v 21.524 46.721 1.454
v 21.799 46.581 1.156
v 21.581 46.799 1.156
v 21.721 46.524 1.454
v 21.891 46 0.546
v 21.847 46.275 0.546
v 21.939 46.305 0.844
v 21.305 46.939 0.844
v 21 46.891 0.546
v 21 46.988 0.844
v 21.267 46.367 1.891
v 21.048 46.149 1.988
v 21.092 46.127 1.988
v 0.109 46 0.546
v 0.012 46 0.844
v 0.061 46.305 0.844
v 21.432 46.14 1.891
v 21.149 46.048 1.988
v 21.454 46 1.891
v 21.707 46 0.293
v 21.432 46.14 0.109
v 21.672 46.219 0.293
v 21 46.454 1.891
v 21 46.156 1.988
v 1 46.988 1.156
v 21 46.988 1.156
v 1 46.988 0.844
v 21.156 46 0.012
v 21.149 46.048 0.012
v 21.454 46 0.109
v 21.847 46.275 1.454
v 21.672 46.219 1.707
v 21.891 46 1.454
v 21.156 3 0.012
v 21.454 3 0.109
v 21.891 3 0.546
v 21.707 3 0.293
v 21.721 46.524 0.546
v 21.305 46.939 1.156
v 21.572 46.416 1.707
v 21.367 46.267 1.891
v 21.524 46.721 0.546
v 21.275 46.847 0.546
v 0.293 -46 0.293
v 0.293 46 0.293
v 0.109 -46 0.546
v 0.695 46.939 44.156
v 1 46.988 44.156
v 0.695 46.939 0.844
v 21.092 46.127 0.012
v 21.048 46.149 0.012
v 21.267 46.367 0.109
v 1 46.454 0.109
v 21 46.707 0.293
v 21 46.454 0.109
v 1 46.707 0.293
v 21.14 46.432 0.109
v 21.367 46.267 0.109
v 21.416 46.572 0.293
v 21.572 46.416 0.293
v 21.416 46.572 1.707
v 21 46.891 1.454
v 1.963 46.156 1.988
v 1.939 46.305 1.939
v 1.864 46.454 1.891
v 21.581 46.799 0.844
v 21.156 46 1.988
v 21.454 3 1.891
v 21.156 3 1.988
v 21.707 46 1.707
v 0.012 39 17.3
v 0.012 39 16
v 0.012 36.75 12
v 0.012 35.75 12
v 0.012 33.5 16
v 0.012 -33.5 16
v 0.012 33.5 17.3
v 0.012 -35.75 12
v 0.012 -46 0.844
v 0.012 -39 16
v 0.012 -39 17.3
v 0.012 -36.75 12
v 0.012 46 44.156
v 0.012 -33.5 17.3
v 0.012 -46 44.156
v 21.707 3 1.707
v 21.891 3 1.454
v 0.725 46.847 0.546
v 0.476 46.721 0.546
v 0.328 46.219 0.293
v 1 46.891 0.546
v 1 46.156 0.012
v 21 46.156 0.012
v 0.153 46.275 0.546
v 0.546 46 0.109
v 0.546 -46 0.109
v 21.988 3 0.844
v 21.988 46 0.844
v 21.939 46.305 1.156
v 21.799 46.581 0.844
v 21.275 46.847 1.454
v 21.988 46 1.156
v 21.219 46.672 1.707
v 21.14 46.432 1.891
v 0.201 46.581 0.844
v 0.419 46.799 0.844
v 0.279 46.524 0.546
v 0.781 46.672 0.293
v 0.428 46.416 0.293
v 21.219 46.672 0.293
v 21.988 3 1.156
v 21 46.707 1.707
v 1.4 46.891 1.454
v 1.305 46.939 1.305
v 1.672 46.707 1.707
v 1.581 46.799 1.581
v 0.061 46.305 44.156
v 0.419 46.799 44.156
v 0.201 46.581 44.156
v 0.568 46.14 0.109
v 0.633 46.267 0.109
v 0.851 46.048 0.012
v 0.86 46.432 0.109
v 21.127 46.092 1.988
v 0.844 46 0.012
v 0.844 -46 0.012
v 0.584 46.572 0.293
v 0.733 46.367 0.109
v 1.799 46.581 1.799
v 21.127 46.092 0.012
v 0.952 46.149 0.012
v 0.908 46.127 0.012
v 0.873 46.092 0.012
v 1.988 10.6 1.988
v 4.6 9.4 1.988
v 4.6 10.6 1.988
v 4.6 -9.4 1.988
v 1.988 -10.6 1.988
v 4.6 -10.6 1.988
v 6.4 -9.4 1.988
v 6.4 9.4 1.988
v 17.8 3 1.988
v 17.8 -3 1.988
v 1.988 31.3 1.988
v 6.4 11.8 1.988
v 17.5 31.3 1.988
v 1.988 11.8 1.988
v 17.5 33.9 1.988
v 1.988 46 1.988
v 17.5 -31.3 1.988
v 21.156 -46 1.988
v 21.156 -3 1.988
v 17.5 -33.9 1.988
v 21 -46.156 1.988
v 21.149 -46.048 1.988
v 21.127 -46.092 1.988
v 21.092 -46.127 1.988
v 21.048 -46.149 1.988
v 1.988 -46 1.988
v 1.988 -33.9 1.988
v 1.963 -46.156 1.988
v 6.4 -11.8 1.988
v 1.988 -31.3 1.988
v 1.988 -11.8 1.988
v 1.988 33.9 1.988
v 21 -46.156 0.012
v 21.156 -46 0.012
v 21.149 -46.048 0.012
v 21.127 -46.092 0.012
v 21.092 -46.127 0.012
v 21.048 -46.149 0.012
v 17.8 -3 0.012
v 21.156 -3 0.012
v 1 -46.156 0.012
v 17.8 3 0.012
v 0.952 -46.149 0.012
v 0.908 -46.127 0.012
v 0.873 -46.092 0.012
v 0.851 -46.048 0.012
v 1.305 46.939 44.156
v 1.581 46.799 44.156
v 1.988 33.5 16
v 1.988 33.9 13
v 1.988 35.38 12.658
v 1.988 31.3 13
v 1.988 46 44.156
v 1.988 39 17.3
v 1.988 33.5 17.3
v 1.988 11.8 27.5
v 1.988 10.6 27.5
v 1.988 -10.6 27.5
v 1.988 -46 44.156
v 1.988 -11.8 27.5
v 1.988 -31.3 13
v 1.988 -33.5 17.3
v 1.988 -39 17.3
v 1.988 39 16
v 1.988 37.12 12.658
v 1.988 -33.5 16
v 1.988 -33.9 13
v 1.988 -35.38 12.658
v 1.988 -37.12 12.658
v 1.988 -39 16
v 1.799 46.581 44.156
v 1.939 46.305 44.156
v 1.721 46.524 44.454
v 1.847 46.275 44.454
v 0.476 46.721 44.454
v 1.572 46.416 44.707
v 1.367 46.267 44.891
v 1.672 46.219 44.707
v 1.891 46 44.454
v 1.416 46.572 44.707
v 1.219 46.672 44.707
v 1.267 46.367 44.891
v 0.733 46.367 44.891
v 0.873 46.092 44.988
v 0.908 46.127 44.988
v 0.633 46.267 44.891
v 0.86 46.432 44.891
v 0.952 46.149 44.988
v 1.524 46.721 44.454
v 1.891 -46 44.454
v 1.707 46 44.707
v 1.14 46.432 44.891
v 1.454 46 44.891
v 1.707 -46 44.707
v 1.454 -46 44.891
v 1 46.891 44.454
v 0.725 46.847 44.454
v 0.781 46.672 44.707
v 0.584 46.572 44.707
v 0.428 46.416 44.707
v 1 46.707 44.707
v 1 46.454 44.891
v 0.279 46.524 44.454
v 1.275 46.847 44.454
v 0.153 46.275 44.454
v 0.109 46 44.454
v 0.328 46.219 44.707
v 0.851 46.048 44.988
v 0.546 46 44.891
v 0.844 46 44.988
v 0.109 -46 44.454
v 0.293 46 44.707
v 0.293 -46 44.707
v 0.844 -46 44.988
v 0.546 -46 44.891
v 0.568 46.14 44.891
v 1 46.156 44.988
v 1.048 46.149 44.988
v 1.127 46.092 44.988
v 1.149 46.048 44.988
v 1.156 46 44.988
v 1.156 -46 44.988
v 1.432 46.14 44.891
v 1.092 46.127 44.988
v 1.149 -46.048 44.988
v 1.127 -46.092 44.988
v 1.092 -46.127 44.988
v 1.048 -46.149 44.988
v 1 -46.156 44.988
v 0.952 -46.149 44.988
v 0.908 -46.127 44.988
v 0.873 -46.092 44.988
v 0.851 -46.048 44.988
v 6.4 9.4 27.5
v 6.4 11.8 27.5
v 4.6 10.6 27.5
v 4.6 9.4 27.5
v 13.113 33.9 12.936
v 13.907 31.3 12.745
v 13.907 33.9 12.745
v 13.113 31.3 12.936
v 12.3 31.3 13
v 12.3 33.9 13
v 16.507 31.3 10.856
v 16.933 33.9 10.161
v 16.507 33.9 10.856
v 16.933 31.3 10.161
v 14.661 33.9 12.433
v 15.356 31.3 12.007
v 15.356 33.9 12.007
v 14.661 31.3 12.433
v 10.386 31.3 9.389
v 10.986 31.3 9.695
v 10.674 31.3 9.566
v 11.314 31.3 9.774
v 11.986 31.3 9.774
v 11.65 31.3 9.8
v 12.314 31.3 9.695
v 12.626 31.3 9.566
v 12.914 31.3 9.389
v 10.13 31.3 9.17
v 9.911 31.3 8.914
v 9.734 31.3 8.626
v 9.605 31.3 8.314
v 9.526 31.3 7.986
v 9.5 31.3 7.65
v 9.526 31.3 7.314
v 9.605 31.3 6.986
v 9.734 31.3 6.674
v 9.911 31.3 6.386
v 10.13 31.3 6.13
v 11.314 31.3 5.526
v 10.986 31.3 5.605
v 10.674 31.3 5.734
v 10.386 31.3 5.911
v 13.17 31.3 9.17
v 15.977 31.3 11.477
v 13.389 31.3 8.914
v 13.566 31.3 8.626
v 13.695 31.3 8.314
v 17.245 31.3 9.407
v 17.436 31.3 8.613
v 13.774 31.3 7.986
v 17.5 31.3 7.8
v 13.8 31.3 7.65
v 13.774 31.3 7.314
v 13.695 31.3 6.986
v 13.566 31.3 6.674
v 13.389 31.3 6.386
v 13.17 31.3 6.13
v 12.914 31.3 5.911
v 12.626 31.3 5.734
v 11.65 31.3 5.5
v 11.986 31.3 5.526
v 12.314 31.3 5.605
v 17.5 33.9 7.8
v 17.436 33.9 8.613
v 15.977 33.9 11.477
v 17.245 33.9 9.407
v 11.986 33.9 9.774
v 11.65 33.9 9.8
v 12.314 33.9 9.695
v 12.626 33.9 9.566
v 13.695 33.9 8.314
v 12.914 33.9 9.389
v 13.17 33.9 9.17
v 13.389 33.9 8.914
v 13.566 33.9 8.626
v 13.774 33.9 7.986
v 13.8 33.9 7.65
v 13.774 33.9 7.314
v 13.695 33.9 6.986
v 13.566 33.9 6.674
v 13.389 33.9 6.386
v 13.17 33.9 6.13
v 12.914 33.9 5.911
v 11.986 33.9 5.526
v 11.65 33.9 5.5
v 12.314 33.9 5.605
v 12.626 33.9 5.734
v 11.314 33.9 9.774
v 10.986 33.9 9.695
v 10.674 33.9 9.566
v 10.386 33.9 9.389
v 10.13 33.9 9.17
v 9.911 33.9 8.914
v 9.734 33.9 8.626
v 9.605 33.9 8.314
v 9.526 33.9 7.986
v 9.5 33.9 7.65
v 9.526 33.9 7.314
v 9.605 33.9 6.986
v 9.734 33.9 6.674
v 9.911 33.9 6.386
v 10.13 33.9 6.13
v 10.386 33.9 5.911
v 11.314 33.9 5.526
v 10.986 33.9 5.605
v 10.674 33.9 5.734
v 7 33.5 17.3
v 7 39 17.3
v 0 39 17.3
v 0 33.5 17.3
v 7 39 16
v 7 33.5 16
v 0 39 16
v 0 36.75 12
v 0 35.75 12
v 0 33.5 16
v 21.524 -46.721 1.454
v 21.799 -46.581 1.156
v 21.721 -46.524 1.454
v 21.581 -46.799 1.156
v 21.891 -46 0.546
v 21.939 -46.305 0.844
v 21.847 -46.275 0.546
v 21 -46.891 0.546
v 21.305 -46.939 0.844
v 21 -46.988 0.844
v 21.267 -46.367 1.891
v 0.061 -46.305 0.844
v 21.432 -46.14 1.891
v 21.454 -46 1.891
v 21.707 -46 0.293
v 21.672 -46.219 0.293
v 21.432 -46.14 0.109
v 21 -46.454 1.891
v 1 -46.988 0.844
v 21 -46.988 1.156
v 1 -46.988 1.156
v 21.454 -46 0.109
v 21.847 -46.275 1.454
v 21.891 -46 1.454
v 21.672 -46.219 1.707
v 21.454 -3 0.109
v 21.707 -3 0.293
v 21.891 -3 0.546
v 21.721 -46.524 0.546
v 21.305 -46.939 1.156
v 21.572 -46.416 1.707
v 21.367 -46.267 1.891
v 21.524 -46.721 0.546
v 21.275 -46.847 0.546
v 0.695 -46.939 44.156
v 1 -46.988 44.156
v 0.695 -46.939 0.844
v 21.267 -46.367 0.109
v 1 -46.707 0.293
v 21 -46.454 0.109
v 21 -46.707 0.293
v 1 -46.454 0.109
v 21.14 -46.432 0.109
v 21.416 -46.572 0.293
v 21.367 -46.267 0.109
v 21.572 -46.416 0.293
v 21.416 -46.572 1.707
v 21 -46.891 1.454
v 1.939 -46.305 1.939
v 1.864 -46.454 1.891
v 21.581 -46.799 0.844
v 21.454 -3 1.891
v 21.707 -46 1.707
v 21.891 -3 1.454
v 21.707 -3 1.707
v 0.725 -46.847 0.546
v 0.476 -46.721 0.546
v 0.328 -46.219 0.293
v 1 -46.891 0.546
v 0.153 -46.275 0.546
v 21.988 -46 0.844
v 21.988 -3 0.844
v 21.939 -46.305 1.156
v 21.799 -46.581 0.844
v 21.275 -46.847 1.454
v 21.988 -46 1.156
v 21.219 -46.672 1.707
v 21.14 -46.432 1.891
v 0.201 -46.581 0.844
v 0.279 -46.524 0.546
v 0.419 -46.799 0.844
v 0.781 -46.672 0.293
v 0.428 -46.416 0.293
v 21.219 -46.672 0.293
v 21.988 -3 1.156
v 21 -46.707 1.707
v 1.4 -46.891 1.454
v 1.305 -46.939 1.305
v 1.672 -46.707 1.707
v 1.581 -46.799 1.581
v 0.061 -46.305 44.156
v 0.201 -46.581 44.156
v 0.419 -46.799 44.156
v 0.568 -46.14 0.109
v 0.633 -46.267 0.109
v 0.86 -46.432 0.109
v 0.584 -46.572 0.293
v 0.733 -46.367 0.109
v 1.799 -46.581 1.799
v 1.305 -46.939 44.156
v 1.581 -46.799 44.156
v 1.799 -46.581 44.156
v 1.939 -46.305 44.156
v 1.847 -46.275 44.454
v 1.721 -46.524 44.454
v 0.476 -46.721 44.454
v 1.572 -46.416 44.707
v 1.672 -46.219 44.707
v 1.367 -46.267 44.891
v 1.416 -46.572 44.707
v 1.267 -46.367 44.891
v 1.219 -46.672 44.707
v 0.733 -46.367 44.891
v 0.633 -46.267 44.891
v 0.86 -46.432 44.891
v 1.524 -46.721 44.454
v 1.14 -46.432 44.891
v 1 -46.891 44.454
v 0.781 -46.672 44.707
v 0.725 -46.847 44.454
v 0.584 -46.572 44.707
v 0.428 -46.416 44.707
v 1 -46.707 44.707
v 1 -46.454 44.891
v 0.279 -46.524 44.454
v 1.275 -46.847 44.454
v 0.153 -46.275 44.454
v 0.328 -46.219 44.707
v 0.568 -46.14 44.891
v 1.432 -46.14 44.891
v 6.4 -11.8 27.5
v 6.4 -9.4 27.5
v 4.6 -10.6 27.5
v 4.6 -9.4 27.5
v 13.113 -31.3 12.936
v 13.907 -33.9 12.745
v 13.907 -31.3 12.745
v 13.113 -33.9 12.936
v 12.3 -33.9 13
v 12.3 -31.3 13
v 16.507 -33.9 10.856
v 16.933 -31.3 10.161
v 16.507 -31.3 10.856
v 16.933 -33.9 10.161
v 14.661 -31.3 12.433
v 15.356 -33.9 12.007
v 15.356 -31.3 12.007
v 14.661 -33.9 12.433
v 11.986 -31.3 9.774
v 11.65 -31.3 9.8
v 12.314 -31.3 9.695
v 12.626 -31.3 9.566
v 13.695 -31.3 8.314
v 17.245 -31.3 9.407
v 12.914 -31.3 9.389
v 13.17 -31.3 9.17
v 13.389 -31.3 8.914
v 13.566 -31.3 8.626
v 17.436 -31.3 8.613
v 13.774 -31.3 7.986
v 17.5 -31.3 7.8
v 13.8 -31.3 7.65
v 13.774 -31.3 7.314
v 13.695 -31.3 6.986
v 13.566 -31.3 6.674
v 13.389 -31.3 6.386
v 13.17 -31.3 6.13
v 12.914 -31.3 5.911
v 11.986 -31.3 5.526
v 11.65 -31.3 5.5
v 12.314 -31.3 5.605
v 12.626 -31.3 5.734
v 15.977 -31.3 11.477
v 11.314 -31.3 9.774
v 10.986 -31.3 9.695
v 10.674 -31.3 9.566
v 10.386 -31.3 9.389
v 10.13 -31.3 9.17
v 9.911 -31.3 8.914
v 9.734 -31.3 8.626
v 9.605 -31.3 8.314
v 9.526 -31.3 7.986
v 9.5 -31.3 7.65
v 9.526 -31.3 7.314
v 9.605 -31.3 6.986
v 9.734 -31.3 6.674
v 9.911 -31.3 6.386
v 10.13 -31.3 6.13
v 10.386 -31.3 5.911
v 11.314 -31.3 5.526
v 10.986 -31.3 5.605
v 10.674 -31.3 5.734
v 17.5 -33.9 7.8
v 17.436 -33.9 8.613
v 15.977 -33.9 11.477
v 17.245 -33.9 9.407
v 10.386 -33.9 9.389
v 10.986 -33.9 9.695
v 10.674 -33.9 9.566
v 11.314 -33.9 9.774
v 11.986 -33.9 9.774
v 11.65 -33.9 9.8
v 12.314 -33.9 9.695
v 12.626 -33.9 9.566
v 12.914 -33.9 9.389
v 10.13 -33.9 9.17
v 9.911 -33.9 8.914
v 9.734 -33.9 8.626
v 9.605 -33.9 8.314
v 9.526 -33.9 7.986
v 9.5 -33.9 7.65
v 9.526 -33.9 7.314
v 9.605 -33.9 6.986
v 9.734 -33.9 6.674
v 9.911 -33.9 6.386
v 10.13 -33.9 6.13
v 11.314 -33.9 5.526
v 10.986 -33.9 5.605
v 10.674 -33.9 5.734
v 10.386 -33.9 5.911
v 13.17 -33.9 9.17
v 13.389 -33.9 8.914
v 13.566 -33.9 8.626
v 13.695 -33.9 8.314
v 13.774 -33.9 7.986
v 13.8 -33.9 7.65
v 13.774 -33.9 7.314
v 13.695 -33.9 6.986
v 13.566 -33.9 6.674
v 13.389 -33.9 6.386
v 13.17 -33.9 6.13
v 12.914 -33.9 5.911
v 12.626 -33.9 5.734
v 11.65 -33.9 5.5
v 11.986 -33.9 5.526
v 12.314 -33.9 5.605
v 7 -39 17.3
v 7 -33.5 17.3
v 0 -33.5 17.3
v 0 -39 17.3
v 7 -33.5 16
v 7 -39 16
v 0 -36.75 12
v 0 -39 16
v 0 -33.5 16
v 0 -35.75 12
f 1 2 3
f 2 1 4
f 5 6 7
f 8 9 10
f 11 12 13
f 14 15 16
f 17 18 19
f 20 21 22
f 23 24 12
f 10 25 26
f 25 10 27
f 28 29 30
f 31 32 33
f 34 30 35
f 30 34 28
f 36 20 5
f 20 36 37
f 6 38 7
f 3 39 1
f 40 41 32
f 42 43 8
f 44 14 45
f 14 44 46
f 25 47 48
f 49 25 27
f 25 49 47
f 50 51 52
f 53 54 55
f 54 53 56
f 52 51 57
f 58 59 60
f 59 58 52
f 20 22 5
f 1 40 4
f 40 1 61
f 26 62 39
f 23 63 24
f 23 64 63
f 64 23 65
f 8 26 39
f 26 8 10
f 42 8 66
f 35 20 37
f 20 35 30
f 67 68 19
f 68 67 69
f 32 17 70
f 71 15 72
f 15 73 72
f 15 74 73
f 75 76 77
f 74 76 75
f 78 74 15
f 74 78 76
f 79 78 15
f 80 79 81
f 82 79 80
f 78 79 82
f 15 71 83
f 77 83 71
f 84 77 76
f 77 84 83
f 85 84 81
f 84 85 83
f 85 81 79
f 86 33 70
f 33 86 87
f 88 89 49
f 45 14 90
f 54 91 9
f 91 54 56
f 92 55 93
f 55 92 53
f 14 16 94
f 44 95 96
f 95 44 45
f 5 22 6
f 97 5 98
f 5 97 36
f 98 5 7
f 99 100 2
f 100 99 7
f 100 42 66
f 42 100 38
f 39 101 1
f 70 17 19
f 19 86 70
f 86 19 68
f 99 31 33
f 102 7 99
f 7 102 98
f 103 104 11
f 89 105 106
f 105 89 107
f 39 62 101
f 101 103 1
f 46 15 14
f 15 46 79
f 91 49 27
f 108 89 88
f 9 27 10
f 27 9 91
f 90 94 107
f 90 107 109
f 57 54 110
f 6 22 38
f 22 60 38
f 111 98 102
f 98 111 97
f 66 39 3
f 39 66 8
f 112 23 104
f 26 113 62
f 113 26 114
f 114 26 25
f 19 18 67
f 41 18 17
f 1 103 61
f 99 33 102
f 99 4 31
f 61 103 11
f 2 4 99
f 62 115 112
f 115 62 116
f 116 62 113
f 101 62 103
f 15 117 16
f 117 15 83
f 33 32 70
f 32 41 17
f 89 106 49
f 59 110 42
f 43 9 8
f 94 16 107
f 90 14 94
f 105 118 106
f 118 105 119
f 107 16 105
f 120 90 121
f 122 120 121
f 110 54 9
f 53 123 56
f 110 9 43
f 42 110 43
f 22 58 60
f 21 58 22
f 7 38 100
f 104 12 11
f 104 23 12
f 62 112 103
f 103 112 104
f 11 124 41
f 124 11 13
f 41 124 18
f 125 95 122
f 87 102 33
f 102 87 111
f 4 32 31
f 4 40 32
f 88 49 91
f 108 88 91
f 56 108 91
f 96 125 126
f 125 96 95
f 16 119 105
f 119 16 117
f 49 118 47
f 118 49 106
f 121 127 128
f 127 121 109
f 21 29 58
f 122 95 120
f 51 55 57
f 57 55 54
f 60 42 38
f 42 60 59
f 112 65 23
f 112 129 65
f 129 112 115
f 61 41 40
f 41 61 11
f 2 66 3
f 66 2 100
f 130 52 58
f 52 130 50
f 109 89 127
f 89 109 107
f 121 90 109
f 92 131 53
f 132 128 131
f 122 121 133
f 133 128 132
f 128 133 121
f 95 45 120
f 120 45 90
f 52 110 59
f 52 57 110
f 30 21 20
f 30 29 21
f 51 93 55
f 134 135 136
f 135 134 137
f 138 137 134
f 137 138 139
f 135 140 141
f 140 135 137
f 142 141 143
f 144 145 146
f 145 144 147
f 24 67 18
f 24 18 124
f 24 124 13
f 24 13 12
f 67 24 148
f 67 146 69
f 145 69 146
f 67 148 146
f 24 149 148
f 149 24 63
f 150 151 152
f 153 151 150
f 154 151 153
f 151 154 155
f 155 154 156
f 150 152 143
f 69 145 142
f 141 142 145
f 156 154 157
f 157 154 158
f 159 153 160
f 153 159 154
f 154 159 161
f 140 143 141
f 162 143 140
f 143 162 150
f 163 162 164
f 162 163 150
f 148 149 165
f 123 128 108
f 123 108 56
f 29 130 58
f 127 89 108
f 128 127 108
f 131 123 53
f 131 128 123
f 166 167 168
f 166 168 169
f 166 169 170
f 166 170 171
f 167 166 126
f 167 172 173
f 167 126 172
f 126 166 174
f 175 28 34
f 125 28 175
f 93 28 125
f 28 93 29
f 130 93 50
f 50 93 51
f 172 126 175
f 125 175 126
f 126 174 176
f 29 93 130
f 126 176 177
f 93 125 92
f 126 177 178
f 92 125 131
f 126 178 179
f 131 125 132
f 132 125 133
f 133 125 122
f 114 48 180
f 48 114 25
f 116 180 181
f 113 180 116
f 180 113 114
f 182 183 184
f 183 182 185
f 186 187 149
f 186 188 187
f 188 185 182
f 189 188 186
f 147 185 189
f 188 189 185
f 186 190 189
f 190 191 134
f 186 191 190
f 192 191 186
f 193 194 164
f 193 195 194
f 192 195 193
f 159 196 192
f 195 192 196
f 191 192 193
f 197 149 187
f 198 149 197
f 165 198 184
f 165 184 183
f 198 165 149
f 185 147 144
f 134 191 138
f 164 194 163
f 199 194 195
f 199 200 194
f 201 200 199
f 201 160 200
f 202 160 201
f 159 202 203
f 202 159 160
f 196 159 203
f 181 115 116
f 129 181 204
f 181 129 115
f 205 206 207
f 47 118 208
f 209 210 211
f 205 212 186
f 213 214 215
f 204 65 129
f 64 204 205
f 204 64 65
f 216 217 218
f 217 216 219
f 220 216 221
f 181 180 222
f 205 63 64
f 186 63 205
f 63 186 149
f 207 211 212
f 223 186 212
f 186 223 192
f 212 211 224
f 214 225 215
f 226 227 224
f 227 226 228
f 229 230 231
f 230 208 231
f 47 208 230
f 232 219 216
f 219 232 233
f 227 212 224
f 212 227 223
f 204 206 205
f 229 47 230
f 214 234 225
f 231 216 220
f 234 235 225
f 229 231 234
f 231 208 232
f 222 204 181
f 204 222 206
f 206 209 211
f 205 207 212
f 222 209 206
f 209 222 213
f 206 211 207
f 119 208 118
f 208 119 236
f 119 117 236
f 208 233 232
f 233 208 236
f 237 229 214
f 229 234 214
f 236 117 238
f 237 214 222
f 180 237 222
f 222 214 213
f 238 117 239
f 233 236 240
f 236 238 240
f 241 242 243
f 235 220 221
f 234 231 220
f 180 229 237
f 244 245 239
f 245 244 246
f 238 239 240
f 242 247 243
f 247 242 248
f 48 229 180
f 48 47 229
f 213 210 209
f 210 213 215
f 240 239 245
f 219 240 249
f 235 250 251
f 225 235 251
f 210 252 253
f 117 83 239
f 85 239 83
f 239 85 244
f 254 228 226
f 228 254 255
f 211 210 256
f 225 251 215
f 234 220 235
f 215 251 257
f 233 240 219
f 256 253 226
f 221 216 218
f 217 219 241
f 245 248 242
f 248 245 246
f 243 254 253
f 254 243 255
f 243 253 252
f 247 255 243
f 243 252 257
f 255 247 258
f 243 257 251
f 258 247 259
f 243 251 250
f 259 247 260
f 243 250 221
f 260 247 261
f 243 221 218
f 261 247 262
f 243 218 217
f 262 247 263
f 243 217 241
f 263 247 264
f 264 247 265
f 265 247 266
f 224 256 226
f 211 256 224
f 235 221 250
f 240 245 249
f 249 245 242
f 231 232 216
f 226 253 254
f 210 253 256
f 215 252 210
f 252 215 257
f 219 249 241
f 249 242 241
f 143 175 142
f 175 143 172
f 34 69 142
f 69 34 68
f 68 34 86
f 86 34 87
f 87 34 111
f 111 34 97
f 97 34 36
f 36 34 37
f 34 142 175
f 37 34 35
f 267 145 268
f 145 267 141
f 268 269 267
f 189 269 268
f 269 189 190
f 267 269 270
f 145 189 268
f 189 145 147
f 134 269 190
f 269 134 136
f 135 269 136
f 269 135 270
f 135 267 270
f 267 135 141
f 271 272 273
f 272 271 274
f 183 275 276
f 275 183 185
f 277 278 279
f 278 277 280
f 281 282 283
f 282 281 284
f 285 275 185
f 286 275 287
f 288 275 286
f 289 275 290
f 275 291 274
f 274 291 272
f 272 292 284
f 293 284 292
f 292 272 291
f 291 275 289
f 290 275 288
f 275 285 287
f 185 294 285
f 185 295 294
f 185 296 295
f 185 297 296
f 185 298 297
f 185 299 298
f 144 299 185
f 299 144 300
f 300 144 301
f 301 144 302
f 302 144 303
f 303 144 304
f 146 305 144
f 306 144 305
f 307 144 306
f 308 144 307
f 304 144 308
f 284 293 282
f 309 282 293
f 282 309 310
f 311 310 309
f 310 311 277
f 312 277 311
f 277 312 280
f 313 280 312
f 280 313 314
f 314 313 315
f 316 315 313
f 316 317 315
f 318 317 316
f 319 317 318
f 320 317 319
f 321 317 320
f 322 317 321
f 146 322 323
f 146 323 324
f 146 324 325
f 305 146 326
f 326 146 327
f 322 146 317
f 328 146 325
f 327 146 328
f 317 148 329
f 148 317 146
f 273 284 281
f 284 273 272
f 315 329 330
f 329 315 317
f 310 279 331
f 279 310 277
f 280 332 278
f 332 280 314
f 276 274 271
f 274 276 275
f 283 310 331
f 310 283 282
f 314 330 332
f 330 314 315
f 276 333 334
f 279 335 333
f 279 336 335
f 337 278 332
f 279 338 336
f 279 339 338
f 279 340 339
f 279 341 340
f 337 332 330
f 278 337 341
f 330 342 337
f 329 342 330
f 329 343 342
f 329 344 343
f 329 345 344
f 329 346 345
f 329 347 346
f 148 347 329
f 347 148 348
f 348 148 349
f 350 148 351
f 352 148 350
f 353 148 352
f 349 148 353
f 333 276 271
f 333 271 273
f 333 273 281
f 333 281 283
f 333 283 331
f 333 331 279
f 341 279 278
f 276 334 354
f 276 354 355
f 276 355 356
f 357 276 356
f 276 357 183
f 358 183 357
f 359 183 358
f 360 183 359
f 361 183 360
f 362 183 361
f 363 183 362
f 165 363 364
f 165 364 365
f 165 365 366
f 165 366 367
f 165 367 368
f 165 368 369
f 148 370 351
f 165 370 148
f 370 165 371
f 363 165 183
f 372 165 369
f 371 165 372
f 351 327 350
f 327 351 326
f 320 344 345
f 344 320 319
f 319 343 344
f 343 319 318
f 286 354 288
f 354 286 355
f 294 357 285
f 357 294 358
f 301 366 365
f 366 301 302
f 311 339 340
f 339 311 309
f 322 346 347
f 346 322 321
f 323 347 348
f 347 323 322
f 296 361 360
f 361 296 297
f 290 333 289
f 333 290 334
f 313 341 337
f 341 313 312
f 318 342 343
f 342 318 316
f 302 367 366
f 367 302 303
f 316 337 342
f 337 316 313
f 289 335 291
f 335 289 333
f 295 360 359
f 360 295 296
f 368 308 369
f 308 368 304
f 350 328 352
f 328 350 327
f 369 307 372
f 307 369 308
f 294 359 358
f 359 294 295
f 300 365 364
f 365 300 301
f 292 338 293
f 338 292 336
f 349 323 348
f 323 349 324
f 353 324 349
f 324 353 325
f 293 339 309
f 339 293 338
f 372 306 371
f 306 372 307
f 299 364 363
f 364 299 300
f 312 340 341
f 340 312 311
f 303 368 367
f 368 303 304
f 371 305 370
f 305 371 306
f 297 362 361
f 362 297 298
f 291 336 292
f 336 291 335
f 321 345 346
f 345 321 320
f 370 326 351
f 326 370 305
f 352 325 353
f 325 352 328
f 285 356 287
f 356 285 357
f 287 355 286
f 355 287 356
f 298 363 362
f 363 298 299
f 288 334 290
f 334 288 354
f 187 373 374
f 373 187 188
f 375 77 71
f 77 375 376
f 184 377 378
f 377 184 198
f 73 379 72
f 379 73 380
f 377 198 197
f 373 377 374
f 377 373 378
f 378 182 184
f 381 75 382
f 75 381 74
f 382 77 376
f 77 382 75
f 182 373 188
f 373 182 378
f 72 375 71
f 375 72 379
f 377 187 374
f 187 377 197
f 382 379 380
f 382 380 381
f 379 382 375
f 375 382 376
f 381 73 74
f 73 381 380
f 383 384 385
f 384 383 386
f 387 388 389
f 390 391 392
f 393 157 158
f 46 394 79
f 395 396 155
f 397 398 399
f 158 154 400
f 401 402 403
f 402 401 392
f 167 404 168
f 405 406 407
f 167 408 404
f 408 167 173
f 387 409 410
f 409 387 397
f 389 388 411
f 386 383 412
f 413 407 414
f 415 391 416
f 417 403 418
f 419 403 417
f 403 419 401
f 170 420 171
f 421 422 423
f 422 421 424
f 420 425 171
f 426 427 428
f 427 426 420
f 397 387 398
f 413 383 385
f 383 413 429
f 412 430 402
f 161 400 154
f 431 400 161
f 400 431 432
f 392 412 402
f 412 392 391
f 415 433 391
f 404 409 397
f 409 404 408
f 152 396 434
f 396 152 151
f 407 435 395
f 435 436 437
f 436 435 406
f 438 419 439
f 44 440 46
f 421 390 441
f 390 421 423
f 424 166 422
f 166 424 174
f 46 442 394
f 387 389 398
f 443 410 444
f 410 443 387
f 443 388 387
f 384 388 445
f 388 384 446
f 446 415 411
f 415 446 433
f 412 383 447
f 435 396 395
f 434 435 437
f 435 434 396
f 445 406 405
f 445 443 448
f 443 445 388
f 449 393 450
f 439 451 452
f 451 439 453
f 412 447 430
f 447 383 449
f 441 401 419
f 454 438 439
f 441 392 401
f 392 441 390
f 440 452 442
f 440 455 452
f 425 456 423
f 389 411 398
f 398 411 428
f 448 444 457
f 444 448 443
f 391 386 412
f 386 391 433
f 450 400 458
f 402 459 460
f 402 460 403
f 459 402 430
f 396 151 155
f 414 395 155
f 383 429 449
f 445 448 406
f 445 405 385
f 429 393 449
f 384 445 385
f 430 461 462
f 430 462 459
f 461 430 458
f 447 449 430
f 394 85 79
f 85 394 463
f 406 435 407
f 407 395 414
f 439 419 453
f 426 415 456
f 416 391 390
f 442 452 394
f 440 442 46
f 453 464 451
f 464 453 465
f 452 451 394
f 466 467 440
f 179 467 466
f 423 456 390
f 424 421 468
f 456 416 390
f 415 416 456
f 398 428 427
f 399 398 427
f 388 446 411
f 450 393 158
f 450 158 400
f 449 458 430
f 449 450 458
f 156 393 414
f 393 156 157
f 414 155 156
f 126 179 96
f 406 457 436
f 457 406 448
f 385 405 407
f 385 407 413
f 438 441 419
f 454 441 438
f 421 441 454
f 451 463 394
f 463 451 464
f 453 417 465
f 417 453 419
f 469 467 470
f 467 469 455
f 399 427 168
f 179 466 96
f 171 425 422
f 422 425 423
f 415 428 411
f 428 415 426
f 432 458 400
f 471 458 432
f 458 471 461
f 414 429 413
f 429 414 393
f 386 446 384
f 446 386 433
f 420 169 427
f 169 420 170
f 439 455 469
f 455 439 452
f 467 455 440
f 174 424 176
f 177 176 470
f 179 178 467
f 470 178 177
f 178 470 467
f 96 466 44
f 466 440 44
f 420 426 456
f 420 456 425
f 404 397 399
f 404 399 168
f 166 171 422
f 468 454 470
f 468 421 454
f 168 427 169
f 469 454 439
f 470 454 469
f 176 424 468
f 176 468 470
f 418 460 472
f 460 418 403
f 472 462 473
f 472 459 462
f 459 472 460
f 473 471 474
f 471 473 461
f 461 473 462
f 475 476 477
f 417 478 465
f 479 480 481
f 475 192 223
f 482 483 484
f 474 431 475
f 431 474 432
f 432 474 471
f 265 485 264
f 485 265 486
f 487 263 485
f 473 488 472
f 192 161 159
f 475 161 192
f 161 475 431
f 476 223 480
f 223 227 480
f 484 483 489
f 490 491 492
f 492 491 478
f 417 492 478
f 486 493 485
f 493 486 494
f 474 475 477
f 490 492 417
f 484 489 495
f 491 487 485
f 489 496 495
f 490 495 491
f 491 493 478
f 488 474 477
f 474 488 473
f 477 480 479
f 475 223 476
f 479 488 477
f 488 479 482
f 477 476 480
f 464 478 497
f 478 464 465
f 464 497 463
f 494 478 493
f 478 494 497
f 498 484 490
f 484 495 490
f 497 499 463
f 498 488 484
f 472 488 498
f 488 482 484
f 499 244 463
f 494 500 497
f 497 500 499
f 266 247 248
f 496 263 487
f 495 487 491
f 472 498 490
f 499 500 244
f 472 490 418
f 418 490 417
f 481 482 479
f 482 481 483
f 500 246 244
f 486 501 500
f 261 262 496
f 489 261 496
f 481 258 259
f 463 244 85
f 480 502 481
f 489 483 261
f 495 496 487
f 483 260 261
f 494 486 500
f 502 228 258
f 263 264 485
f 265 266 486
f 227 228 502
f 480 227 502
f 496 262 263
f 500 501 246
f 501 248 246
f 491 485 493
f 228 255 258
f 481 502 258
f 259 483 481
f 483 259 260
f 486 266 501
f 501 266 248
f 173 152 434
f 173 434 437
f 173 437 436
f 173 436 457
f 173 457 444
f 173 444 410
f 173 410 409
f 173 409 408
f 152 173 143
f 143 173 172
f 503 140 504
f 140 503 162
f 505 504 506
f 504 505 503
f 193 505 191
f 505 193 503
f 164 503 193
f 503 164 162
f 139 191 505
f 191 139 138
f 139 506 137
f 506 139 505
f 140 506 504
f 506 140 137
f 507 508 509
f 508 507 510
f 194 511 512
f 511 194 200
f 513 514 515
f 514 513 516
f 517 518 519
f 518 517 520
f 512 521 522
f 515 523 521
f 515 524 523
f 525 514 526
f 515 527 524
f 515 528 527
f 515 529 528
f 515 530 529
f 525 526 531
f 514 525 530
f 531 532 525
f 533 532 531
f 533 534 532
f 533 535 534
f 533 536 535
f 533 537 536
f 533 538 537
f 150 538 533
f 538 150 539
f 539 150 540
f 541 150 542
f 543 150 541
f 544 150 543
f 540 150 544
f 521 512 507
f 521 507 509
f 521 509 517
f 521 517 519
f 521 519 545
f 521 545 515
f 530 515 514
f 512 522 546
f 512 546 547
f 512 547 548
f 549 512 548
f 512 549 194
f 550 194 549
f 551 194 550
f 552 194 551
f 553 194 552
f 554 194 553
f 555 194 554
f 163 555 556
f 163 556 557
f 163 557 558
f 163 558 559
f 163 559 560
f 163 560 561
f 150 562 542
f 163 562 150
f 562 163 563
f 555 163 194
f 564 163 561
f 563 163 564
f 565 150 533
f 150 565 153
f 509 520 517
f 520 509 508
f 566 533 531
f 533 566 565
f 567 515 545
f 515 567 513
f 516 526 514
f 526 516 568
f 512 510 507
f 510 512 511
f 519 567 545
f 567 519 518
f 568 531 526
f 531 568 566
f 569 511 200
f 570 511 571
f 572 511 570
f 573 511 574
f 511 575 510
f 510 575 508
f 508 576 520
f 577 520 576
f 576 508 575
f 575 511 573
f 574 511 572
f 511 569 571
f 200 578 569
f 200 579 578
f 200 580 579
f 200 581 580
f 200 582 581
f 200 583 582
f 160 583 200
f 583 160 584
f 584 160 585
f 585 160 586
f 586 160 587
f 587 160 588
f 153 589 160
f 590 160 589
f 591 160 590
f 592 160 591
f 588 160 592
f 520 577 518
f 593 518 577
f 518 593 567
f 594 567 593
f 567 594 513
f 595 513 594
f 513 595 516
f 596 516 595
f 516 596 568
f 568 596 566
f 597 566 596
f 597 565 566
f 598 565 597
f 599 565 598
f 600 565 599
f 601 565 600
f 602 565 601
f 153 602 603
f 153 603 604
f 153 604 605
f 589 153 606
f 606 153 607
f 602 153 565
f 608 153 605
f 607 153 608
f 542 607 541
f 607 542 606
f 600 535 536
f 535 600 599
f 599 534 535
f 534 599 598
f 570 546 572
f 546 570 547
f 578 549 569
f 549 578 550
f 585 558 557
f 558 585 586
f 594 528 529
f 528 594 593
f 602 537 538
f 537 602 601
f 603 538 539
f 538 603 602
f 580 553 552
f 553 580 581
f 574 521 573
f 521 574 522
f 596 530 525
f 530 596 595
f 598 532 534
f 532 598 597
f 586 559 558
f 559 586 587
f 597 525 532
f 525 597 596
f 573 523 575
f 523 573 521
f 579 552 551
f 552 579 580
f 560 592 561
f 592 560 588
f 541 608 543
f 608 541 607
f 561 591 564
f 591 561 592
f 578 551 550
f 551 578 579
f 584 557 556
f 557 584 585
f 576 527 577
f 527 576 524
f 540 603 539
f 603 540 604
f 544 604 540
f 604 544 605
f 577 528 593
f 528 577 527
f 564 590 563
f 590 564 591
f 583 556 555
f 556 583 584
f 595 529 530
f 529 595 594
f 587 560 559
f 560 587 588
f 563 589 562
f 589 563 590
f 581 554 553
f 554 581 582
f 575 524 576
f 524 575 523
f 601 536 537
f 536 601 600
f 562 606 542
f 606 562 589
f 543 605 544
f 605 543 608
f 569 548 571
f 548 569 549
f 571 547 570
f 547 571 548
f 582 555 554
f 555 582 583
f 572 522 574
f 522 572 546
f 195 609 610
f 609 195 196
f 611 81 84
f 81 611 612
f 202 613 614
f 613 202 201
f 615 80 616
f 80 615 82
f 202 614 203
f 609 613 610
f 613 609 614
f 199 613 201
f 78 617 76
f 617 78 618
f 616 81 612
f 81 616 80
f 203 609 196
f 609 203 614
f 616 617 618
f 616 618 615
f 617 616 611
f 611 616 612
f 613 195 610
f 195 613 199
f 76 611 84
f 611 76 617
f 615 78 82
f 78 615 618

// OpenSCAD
module half() {
    // main mass
    module s(t) {
        translate(t) translate([1,1,1]) sphere(r=1, $fn=20);
    }

    difference() {
        union() {
            hull() {
                s([0,-1,0]);
                s([20,-1,0]);
                s([20,45,0]);
                s([0,45,0]);
            }
            hull() {
                s([0,-1,0]);
                s([0,-1,43]);
                s([0,45,43]);
                s([0,45,0]);
            }
        }
        color("red") translate([22-4.2,-1,0]) cube([4.2,4,2]);
    }
    
    // inner socket
    color("purple") translate([1, 10.6,1]) {
      cube([5.4,1.2,26.5]);
     translate([5.4-1.8,-1.2,0]) cube([1.8,1.8,26.5]);
    }

    // outer socket
    translate([1,31.3,1])
     difference() {
       color("blue") hull() {
        cube([11,2.6,12]);
        translate([15.5,0,0]) cube([1,2.6,1]);
        translate([16.5-5.2, 0, 12-5.2]) rotate([-90,0,0]) cylinder(r=5.2,h=2.6, $fn=40);
       }
       hole_dia=4.3;
       color("red") translate([8.5+hole_dia/2, 0, 4.5+hole_dia/2])
        rotate([-90,0,0])
        cylinder(d=4.3,h=2.6, $fn=40);
     };

    // rest
     color("green")
      translate([0,33.5,0]) 
      hull() {
        translate([0,0,16]) cube([7,5.5,1.3]);
        translate([0,2.25,12]) cube([1,1,1]);
      }
}

half();
mirror([0,1,0]) half();        
